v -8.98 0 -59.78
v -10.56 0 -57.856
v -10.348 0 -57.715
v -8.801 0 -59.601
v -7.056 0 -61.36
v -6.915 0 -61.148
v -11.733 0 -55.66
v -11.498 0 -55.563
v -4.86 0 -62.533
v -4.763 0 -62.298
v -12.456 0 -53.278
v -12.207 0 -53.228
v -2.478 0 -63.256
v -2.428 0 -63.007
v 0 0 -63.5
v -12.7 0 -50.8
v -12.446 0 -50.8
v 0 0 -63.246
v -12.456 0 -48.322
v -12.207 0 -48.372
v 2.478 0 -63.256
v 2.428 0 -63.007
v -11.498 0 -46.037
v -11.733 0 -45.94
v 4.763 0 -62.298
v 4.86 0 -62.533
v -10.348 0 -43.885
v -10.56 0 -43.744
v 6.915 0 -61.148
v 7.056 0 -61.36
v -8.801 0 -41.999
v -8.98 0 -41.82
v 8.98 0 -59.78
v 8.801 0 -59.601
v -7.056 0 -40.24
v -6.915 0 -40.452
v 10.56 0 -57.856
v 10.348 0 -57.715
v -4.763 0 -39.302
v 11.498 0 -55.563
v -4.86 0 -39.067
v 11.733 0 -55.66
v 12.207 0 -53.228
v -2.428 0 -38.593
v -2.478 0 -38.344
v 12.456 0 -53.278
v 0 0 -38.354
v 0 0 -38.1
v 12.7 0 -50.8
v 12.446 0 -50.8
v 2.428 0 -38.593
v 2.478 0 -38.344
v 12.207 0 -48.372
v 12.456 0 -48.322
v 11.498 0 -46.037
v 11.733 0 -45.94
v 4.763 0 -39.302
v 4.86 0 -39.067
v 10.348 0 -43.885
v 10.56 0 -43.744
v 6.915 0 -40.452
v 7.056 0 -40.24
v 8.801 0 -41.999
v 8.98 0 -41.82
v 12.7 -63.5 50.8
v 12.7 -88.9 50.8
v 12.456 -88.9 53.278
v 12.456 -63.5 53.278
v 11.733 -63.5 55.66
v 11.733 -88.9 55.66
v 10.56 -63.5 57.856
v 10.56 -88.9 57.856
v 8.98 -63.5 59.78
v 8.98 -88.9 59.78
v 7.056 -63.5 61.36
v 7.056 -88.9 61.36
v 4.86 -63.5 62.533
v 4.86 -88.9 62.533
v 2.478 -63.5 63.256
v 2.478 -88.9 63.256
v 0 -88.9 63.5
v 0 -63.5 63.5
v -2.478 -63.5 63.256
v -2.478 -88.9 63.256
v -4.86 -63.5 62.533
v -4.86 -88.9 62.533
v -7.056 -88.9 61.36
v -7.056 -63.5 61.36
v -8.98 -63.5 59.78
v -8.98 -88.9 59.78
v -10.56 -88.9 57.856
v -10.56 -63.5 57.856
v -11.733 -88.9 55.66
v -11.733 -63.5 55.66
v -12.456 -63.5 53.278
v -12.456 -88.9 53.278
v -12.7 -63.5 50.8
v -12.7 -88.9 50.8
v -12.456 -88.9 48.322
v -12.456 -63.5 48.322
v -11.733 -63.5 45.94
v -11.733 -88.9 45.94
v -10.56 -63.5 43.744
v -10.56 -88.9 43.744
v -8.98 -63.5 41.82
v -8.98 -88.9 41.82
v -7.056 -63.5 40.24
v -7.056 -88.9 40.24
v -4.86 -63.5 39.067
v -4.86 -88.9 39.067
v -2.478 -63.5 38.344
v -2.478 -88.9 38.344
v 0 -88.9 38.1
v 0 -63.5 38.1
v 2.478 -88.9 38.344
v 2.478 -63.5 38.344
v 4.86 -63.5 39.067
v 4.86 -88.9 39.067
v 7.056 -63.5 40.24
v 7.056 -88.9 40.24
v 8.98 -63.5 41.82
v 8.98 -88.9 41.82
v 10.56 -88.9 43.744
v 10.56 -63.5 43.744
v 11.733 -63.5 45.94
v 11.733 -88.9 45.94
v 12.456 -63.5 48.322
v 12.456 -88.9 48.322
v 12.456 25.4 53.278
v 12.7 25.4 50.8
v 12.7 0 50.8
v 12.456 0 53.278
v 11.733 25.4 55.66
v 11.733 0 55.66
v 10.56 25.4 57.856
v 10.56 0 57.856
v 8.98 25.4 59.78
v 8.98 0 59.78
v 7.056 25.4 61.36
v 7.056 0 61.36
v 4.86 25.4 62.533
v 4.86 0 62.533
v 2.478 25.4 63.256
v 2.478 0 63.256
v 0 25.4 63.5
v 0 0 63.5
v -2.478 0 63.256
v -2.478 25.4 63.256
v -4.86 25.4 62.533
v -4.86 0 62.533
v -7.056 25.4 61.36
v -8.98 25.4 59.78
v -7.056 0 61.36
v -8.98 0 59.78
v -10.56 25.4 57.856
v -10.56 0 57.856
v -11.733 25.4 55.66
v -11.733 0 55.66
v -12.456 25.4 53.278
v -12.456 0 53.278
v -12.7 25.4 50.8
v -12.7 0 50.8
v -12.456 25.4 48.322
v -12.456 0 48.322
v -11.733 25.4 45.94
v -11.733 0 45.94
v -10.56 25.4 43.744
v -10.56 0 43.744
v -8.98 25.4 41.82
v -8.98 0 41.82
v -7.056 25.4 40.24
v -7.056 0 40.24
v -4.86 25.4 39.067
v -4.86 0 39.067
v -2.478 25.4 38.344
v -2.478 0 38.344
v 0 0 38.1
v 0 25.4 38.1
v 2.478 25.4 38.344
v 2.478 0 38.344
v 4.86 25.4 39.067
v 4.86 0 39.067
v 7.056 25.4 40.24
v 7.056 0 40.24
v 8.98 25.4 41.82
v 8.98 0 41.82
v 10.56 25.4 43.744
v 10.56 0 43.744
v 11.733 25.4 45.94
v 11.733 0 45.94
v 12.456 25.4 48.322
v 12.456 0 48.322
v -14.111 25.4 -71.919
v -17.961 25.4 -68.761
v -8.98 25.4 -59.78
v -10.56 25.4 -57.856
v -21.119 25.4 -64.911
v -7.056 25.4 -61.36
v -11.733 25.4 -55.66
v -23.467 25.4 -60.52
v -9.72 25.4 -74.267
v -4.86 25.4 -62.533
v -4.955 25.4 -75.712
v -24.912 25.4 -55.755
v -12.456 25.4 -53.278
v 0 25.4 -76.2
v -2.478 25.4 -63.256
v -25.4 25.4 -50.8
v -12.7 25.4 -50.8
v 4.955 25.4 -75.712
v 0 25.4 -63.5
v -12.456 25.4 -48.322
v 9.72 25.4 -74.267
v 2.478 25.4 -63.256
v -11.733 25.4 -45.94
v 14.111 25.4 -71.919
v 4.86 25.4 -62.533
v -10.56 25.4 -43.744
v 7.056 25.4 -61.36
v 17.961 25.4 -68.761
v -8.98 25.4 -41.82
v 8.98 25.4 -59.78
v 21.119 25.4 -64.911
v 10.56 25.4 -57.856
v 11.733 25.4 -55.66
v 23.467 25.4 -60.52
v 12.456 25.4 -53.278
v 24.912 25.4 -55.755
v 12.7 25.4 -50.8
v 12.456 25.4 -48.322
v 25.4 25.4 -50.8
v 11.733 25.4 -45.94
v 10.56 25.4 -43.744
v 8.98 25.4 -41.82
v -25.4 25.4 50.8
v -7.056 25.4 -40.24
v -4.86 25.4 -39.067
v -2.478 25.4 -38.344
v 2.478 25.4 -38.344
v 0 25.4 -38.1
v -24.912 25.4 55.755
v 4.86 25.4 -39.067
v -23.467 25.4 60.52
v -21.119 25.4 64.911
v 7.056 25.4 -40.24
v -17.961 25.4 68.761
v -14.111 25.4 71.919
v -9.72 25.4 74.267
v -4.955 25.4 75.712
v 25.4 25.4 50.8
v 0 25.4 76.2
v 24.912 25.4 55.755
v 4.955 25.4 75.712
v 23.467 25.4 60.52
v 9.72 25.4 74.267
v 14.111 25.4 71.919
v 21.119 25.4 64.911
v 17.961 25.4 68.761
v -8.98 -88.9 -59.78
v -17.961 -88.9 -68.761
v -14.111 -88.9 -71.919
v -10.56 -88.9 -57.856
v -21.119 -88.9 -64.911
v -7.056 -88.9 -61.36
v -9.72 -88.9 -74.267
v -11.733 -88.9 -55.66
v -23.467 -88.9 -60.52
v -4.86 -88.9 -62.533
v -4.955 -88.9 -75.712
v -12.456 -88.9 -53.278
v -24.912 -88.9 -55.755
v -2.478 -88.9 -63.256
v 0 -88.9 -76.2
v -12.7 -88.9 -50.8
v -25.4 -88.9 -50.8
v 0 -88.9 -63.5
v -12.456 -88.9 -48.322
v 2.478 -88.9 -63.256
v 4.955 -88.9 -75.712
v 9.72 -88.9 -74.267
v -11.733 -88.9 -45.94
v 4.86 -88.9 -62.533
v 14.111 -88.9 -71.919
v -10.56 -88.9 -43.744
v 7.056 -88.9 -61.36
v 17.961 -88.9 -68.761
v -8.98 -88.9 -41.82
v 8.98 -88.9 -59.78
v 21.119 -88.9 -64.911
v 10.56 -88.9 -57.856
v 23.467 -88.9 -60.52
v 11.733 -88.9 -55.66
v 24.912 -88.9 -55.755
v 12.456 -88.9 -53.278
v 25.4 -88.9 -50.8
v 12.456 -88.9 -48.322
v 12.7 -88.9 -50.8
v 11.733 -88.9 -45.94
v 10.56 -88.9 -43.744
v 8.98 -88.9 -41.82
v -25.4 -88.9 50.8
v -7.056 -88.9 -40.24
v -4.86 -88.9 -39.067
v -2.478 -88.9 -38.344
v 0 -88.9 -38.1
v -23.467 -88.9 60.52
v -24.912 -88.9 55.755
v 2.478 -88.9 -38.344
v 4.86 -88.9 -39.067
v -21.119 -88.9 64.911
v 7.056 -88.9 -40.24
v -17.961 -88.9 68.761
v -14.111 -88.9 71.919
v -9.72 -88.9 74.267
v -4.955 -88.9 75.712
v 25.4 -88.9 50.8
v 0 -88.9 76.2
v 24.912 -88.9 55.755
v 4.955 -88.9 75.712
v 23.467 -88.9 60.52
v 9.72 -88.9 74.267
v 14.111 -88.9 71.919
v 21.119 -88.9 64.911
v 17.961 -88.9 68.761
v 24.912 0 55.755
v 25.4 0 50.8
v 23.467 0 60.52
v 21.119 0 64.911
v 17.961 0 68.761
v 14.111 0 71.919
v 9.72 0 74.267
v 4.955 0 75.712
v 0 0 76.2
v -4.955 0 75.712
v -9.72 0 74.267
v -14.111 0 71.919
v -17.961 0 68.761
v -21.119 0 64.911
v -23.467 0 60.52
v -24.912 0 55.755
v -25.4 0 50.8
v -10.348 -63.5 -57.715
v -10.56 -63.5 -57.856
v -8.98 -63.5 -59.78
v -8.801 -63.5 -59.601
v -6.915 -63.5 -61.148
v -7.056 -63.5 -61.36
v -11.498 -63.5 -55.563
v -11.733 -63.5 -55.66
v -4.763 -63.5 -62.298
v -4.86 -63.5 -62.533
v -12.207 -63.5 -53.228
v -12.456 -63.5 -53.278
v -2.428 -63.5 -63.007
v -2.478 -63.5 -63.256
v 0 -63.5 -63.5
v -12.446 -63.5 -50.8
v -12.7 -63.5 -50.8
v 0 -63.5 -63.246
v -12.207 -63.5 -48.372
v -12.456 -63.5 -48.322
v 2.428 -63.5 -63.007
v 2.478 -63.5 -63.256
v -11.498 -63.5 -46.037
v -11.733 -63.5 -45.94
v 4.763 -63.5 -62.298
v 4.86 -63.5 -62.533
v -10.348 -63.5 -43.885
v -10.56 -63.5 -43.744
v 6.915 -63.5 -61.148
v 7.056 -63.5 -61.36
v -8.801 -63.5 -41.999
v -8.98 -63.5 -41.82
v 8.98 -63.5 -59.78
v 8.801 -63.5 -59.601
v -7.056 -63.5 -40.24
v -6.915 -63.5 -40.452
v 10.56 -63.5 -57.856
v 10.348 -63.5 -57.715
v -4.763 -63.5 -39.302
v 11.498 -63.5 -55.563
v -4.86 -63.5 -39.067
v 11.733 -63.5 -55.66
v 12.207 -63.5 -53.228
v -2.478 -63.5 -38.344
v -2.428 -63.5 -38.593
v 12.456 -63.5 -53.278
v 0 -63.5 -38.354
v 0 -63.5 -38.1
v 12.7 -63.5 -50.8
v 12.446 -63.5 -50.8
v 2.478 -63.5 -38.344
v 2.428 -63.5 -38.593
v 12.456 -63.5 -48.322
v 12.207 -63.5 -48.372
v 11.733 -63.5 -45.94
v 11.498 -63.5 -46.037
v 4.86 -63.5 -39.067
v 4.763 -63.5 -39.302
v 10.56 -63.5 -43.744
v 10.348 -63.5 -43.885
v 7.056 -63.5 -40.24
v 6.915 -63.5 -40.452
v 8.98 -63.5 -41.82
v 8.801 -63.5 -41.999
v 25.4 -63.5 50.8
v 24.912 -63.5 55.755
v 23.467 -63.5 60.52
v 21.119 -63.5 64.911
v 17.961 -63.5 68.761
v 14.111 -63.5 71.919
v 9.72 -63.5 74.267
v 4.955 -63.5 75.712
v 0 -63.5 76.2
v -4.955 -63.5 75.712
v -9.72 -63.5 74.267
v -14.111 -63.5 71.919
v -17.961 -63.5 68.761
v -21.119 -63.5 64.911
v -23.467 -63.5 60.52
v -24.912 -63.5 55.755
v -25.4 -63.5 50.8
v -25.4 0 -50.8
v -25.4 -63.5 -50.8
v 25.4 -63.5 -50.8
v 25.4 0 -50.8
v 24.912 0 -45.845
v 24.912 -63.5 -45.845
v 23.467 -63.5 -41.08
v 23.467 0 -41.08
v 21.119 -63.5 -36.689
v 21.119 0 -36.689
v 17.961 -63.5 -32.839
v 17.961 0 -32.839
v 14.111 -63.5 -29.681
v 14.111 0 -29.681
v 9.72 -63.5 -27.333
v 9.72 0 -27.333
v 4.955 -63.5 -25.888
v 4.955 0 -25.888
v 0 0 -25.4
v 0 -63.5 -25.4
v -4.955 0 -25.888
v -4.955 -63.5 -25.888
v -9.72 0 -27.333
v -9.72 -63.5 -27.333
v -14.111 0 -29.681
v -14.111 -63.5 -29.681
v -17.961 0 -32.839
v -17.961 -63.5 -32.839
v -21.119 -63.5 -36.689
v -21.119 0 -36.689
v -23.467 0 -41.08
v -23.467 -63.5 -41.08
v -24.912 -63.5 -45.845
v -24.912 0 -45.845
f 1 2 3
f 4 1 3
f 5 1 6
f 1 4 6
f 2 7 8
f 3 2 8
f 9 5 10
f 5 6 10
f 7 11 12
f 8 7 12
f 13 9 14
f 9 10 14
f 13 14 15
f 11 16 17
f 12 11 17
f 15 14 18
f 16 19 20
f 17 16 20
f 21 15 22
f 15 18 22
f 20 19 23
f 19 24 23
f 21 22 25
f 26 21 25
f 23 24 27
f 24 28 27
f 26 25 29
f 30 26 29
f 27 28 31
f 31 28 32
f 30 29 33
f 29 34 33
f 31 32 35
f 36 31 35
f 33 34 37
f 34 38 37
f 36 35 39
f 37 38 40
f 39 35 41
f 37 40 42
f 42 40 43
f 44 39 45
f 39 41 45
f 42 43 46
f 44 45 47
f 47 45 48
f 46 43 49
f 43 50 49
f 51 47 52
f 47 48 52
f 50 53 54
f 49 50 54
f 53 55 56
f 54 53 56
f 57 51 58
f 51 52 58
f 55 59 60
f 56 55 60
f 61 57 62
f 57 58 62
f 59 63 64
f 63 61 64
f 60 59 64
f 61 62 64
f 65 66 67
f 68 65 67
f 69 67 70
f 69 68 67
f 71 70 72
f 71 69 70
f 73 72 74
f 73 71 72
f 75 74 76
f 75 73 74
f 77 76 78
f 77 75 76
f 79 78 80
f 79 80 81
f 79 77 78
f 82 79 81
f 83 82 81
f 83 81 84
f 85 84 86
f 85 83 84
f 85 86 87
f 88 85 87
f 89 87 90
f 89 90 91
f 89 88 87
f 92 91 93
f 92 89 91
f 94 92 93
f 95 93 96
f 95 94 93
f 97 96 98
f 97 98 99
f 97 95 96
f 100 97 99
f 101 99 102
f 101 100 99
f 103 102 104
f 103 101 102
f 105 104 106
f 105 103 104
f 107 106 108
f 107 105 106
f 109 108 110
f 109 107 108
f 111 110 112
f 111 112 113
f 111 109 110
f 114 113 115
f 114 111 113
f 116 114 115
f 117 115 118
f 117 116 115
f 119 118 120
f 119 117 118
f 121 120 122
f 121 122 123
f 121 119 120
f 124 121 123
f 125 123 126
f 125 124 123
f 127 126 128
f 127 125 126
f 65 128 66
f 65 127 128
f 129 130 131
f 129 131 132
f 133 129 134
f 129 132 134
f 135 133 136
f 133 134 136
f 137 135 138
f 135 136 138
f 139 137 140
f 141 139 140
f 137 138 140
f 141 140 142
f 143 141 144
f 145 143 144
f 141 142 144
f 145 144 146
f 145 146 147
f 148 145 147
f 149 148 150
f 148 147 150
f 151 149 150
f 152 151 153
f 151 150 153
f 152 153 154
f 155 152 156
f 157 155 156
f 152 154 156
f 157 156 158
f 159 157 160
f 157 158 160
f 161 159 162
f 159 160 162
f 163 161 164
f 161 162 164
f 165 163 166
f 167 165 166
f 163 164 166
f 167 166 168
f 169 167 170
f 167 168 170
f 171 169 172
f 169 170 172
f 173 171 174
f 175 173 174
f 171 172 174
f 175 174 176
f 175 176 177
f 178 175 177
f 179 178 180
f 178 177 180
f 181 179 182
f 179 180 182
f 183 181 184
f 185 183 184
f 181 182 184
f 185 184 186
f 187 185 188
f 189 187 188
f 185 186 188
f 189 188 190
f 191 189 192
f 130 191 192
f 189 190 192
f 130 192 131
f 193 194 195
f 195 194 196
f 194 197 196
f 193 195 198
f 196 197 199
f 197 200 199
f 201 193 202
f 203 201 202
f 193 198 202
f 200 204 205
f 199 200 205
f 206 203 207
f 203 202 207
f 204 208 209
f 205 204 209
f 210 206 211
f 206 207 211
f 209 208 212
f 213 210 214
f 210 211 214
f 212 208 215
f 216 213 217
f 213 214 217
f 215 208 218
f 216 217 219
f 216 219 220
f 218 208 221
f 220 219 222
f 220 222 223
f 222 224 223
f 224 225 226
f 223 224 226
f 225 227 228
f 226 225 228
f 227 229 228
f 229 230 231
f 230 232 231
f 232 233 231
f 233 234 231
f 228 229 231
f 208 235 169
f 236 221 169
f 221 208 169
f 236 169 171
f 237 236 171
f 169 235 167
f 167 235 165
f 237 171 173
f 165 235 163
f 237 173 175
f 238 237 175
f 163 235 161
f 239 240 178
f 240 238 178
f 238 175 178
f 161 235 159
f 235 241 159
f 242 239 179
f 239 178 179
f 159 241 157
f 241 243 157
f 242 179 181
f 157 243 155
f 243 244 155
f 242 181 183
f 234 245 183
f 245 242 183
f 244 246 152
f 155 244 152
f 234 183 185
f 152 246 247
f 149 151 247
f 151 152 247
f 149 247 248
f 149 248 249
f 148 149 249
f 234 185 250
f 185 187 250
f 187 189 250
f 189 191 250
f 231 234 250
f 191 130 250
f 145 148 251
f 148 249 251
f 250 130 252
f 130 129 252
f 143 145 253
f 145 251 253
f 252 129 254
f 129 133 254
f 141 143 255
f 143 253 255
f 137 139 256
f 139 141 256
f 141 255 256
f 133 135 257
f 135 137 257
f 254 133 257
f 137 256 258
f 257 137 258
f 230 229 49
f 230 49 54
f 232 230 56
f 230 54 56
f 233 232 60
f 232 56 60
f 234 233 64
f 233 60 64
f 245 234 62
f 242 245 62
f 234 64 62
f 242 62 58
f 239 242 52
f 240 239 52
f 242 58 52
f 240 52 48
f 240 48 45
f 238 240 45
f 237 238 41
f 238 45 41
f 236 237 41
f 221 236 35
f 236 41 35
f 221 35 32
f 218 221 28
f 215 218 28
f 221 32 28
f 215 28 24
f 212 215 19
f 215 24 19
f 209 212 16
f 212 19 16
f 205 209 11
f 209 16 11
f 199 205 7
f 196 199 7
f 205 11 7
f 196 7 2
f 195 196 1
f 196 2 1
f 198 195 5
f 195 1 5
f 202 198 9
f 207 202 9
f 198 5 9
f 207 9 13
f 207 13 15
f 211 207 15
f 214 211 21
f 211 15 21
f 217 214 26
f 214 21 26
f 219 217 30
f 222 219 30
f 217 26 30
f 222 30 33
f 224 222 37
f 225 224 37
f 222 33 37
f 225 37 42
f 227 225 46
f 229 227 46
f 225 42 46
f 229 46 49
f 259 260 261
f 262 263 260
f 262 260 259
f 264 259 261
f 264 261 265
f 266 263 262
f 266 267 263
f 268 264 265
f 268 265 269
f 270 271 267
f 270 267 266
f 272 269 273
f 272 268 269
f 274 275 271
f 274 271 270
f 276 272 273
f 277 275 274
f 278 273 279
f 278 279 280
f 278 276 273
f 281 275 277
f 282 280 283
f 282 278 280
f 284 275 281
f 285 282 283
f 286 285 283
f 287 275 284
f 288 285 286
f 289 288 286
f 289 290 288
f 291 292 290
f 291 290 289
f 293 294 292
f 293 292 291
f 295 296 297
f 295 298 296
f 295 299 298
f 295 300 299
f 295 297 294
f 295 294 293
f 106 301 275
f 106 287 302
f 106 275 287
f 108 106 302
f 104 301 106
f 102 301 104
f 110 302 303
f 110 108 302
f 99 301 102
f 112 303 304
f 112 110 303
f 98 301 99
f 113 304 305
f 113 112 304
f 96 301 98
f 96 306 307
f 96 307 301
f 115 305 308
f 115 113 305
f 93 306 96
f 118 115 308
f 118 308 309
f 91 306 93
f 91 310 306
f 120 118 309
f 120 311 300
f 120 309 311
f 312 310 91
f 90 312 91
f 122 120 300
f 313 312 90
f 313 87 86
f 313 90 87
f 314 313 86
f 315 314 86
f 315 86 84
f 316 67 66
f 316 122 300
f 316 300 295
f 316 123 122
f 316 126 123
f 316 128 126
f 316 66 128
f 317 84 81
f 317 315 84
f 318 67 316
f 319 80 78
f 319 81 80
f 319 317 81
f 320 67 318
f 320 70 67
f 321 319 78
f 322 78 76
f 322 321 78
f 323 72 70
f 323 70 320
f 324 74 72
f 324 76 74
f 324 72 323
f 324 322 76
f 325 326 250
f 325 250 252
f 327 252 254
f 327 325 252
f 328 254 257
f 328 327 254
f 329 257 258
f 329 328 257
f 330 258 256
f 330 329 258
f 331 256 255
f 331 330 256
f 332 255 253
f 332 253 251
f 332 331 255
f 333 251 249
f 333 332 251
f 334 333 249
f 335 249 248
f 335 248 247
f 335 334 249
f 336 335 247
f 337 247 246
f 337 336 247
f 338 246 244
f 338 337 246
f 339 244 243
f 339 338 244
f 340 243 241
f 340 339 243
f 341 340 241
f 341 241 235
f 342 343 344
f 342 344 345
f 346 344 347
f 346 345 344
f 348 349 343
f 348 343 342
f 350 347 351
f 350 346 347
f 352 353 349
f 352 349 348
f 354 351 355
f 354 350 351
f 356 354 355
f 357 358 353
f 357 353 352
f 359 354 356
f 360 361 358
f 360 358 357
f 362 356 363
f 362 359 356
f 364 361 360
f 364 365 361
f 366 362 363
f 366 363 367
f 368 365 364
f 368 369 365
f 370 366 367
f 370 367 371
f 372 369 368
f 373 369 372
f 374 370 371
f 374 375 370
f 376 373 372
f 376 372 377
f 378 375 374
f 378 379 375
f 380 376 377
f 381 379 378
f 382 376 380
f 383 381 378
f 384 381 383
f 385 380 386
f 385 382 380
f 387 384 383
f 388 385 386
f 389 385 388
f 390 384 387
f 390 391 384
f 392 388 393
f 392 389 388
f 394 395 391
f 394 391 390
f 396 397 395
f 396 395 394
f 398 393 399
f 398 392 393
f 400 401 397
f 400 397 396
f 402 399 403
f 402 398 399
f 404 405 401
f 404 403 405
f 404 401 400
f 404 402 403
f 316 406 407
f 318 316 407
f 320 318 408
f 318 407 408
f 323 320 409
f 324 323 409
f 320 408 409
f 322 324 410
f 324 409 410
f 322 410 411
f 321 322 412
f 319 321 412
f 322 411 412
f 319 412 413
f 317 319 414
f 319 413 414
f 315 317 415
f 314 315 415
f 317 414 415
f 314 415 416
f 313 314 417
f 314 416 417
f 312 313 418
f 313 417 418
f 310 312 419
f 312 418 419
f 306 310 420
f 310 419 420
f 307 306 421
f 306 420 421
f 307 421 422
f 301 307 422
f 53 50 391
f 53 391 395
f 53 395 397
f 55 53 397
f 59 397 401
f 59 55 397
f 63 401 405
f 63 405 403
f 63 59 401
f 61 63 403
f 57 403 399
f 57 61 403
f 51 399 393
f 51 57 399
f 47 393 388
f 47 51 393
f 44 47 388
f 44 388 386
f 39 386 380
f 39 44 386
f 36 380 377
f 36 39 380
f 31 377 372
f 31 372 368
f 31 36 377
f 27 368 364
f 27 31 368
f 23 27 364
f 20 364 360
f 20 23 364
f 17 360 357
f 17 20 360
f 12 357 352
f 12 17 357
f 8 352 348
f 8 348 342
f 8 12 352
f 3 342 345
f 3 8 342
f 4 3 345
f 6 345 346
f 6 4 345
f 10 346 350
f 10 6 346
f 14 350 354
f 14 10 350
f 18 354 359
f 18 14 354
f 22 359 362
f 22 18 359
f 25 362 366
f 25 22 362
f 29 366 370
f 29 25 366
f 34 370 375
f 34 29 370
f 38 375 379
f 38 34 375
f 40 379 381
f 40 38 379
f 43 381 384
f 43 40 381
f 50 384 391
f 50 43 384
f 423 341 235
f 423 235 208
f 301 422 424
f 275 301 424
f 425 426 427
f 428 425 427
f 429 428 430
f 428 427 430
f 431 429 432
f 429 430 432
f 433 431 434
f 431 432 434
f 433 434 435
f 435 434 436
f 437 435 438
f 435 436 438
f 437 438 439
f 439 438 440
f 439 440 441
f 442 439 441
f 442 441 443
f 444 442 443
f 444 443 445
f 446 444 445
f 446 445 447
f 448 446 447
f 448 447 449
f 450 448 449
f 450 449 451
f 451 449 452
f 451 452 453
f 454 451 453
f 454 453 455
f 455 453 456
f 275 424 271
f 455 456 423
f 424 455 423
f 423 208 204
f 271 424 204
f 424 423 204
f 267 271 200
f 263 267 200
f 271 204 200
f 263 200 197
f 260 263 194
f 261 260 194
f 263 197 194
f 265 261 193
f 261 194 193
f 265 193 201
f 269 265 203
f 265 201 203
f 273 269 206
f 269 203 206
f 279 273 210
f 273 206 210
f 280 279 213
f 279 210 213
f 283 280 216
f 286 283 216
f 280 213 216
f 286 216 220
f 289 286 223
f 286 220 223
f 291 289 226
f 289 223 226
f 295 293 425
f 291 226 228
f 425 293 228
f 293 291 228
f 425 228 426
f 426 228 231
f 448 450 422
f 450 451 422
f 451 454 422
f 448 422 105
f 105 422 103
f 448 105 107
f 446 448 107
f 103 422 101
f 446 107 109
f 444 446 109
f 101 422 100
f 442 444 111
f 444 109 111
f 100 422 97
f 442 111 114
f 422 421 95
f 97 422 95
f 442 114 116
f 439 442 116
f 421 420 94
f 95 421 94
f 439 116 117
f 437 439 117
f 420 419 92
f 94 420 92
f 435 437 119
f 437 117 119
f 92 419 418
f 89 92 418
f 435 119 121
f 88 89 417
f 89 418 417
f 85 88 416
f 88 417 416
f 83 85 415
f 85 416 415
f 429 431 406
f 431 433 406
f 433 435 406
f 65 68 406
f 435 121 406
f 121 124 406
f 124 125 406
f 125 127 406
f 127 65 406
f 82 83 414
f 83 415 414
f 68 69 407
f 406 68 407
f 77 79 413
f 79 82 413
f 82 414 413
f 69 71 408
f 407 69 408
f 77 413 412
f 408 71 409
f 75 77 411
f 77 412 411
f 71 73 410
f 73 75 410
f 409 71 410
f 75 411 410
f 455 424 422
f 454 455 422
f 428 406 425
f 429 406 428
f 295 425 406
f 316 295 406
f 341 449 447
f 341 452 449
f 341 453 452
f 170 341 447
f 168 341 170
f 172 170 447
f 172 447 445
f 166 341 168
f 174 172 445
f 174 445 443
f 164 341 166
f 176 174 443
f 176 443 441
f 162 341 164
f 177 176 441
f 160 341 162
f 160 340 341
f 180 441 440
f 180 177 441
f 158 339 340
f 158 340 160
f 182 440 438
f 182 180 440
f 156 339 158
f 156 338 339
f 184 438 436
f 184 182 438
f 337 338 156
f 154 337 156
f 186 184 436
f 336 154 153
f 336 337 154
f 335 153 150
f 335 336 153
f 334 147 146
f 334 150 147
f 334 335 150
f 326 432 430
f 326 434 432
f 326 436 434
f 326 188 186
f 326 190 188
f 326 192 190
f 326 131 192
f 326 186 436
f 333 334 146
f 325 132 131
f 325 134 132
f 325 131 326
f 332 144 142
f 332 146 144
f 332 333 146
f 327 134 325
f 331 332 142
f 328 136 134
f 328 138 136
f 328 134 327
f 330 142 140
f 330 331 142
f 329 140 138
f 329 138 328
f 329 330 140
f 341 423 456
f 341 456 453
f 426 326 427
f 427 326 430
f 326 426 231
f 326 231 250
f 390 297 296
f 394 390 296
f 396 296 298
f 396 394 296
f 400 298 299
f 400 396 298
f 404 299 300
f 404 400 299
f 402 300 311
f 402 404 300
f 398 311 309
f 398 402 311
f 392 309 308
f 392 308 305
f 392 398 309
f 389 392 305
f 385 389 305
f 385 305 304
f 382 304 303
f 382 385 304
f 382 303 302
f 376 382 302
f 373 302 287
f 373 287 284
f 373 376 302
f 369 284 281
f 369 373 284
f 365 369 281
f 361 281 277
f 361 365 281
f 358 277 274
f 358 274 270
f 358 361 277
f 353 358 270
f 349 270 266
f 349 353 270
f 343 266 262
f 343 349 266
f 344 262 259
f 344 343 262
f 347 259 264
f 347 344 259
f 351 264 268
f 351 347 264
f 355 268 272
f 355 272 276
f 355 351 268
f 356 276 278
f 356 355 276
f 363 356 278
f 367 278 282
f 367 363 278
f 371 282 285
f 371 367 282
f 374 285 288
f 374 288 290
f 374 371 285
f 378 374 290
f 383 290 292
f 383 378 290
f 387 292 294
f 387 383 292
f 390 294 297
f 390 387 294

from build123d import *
from build123d import SkipClean  # not in build123d's __all__

# Parameters (mm, degrees)
F0_R     = 12.7
F1_DEPTH = 25.4
F2_R     = 25.4
F2_R_2   = 12.4458783194
F3_DEPTH = 63.5
F4_R     = 12.7
F5_DEPTH = 25.4


# Not quite as in the source:
# - after a boolean that leaves OpenCascade's solid faulty, fix() repairs it


with BuildPart() as f1:
    # F0 (on Front) → F1 (new body)
    with BuildSketch(Plane.XZ):
        with BuildLine():
            ThreePointArc((-25.4, -50.8), (0, -76.2), (25.4, -50.8))
            Line((25.4, -50.8), (25.4, 50.8))
            ThreePointArc((25.4, 50.8), (0, 76.2), (-25.4, 50.8))
            Line((-25.4, 50.8), (-25.4, -50.8))
        make_face()
        with Locations((0, -50.8)):
            Circle(F0_R, mode=Mode.SUBTRACT)
        with Locations((0, 50.8)):
            Circle(F0_R, mode=Mode.SUBTRACT)
    extrude(amount=-F1_DEPTH)

    # F2 (on face) → F3 (join)
    with BuildSketch(Plane.XZ):
        with Locations((0, -50.8)):
            Circle(F2_R)
        with Locations((0, -50.8)):
            Circle(F2_R_2, mode=Mode.SUBTRACT)
    with SkipClean():  # cleaning this boolean's faces spoils the solid; the shape is the same uncleaned
        extrude(amount=F3_DEPTH)

    # F4 (on face) → F5 (join)
    with BuildSketch(Plane.XZ.offset(63.5)):
        with BuildLine():
            Line((-25.4, 50.8), (-25.4, -50.8))
            ThreePointArc((-25.4, -50.8), (0, -25.4), (25.4, -50.8))
            Line((25.4, -50.8), (25.4, 50.8))
            ThreePointArc((25.4, 50.8), (0, 76.2), (-25.4, 50.8))
        make_face()
        with Locations((0, 50.8)):
            Circle(F4_R, mode=Mode.SUBTRACT)
        with BuildLine():
            ThreePointArc((25.4, -50.8), (0, -25.4), (-25.4, -50.8))
            ThreePointArc((-25.4, -50.8), (0, -76.2), (25.4, -50.8))
        make_face()
        with Locations((0, -50.8)):
            Circle(F4_R, mode=Mode.SUBTRACT)
    extrude(amount=F5_DEPTH)

    add(f1.part.fix(), mode=Mode.REPLACE)


solid = f1.part
